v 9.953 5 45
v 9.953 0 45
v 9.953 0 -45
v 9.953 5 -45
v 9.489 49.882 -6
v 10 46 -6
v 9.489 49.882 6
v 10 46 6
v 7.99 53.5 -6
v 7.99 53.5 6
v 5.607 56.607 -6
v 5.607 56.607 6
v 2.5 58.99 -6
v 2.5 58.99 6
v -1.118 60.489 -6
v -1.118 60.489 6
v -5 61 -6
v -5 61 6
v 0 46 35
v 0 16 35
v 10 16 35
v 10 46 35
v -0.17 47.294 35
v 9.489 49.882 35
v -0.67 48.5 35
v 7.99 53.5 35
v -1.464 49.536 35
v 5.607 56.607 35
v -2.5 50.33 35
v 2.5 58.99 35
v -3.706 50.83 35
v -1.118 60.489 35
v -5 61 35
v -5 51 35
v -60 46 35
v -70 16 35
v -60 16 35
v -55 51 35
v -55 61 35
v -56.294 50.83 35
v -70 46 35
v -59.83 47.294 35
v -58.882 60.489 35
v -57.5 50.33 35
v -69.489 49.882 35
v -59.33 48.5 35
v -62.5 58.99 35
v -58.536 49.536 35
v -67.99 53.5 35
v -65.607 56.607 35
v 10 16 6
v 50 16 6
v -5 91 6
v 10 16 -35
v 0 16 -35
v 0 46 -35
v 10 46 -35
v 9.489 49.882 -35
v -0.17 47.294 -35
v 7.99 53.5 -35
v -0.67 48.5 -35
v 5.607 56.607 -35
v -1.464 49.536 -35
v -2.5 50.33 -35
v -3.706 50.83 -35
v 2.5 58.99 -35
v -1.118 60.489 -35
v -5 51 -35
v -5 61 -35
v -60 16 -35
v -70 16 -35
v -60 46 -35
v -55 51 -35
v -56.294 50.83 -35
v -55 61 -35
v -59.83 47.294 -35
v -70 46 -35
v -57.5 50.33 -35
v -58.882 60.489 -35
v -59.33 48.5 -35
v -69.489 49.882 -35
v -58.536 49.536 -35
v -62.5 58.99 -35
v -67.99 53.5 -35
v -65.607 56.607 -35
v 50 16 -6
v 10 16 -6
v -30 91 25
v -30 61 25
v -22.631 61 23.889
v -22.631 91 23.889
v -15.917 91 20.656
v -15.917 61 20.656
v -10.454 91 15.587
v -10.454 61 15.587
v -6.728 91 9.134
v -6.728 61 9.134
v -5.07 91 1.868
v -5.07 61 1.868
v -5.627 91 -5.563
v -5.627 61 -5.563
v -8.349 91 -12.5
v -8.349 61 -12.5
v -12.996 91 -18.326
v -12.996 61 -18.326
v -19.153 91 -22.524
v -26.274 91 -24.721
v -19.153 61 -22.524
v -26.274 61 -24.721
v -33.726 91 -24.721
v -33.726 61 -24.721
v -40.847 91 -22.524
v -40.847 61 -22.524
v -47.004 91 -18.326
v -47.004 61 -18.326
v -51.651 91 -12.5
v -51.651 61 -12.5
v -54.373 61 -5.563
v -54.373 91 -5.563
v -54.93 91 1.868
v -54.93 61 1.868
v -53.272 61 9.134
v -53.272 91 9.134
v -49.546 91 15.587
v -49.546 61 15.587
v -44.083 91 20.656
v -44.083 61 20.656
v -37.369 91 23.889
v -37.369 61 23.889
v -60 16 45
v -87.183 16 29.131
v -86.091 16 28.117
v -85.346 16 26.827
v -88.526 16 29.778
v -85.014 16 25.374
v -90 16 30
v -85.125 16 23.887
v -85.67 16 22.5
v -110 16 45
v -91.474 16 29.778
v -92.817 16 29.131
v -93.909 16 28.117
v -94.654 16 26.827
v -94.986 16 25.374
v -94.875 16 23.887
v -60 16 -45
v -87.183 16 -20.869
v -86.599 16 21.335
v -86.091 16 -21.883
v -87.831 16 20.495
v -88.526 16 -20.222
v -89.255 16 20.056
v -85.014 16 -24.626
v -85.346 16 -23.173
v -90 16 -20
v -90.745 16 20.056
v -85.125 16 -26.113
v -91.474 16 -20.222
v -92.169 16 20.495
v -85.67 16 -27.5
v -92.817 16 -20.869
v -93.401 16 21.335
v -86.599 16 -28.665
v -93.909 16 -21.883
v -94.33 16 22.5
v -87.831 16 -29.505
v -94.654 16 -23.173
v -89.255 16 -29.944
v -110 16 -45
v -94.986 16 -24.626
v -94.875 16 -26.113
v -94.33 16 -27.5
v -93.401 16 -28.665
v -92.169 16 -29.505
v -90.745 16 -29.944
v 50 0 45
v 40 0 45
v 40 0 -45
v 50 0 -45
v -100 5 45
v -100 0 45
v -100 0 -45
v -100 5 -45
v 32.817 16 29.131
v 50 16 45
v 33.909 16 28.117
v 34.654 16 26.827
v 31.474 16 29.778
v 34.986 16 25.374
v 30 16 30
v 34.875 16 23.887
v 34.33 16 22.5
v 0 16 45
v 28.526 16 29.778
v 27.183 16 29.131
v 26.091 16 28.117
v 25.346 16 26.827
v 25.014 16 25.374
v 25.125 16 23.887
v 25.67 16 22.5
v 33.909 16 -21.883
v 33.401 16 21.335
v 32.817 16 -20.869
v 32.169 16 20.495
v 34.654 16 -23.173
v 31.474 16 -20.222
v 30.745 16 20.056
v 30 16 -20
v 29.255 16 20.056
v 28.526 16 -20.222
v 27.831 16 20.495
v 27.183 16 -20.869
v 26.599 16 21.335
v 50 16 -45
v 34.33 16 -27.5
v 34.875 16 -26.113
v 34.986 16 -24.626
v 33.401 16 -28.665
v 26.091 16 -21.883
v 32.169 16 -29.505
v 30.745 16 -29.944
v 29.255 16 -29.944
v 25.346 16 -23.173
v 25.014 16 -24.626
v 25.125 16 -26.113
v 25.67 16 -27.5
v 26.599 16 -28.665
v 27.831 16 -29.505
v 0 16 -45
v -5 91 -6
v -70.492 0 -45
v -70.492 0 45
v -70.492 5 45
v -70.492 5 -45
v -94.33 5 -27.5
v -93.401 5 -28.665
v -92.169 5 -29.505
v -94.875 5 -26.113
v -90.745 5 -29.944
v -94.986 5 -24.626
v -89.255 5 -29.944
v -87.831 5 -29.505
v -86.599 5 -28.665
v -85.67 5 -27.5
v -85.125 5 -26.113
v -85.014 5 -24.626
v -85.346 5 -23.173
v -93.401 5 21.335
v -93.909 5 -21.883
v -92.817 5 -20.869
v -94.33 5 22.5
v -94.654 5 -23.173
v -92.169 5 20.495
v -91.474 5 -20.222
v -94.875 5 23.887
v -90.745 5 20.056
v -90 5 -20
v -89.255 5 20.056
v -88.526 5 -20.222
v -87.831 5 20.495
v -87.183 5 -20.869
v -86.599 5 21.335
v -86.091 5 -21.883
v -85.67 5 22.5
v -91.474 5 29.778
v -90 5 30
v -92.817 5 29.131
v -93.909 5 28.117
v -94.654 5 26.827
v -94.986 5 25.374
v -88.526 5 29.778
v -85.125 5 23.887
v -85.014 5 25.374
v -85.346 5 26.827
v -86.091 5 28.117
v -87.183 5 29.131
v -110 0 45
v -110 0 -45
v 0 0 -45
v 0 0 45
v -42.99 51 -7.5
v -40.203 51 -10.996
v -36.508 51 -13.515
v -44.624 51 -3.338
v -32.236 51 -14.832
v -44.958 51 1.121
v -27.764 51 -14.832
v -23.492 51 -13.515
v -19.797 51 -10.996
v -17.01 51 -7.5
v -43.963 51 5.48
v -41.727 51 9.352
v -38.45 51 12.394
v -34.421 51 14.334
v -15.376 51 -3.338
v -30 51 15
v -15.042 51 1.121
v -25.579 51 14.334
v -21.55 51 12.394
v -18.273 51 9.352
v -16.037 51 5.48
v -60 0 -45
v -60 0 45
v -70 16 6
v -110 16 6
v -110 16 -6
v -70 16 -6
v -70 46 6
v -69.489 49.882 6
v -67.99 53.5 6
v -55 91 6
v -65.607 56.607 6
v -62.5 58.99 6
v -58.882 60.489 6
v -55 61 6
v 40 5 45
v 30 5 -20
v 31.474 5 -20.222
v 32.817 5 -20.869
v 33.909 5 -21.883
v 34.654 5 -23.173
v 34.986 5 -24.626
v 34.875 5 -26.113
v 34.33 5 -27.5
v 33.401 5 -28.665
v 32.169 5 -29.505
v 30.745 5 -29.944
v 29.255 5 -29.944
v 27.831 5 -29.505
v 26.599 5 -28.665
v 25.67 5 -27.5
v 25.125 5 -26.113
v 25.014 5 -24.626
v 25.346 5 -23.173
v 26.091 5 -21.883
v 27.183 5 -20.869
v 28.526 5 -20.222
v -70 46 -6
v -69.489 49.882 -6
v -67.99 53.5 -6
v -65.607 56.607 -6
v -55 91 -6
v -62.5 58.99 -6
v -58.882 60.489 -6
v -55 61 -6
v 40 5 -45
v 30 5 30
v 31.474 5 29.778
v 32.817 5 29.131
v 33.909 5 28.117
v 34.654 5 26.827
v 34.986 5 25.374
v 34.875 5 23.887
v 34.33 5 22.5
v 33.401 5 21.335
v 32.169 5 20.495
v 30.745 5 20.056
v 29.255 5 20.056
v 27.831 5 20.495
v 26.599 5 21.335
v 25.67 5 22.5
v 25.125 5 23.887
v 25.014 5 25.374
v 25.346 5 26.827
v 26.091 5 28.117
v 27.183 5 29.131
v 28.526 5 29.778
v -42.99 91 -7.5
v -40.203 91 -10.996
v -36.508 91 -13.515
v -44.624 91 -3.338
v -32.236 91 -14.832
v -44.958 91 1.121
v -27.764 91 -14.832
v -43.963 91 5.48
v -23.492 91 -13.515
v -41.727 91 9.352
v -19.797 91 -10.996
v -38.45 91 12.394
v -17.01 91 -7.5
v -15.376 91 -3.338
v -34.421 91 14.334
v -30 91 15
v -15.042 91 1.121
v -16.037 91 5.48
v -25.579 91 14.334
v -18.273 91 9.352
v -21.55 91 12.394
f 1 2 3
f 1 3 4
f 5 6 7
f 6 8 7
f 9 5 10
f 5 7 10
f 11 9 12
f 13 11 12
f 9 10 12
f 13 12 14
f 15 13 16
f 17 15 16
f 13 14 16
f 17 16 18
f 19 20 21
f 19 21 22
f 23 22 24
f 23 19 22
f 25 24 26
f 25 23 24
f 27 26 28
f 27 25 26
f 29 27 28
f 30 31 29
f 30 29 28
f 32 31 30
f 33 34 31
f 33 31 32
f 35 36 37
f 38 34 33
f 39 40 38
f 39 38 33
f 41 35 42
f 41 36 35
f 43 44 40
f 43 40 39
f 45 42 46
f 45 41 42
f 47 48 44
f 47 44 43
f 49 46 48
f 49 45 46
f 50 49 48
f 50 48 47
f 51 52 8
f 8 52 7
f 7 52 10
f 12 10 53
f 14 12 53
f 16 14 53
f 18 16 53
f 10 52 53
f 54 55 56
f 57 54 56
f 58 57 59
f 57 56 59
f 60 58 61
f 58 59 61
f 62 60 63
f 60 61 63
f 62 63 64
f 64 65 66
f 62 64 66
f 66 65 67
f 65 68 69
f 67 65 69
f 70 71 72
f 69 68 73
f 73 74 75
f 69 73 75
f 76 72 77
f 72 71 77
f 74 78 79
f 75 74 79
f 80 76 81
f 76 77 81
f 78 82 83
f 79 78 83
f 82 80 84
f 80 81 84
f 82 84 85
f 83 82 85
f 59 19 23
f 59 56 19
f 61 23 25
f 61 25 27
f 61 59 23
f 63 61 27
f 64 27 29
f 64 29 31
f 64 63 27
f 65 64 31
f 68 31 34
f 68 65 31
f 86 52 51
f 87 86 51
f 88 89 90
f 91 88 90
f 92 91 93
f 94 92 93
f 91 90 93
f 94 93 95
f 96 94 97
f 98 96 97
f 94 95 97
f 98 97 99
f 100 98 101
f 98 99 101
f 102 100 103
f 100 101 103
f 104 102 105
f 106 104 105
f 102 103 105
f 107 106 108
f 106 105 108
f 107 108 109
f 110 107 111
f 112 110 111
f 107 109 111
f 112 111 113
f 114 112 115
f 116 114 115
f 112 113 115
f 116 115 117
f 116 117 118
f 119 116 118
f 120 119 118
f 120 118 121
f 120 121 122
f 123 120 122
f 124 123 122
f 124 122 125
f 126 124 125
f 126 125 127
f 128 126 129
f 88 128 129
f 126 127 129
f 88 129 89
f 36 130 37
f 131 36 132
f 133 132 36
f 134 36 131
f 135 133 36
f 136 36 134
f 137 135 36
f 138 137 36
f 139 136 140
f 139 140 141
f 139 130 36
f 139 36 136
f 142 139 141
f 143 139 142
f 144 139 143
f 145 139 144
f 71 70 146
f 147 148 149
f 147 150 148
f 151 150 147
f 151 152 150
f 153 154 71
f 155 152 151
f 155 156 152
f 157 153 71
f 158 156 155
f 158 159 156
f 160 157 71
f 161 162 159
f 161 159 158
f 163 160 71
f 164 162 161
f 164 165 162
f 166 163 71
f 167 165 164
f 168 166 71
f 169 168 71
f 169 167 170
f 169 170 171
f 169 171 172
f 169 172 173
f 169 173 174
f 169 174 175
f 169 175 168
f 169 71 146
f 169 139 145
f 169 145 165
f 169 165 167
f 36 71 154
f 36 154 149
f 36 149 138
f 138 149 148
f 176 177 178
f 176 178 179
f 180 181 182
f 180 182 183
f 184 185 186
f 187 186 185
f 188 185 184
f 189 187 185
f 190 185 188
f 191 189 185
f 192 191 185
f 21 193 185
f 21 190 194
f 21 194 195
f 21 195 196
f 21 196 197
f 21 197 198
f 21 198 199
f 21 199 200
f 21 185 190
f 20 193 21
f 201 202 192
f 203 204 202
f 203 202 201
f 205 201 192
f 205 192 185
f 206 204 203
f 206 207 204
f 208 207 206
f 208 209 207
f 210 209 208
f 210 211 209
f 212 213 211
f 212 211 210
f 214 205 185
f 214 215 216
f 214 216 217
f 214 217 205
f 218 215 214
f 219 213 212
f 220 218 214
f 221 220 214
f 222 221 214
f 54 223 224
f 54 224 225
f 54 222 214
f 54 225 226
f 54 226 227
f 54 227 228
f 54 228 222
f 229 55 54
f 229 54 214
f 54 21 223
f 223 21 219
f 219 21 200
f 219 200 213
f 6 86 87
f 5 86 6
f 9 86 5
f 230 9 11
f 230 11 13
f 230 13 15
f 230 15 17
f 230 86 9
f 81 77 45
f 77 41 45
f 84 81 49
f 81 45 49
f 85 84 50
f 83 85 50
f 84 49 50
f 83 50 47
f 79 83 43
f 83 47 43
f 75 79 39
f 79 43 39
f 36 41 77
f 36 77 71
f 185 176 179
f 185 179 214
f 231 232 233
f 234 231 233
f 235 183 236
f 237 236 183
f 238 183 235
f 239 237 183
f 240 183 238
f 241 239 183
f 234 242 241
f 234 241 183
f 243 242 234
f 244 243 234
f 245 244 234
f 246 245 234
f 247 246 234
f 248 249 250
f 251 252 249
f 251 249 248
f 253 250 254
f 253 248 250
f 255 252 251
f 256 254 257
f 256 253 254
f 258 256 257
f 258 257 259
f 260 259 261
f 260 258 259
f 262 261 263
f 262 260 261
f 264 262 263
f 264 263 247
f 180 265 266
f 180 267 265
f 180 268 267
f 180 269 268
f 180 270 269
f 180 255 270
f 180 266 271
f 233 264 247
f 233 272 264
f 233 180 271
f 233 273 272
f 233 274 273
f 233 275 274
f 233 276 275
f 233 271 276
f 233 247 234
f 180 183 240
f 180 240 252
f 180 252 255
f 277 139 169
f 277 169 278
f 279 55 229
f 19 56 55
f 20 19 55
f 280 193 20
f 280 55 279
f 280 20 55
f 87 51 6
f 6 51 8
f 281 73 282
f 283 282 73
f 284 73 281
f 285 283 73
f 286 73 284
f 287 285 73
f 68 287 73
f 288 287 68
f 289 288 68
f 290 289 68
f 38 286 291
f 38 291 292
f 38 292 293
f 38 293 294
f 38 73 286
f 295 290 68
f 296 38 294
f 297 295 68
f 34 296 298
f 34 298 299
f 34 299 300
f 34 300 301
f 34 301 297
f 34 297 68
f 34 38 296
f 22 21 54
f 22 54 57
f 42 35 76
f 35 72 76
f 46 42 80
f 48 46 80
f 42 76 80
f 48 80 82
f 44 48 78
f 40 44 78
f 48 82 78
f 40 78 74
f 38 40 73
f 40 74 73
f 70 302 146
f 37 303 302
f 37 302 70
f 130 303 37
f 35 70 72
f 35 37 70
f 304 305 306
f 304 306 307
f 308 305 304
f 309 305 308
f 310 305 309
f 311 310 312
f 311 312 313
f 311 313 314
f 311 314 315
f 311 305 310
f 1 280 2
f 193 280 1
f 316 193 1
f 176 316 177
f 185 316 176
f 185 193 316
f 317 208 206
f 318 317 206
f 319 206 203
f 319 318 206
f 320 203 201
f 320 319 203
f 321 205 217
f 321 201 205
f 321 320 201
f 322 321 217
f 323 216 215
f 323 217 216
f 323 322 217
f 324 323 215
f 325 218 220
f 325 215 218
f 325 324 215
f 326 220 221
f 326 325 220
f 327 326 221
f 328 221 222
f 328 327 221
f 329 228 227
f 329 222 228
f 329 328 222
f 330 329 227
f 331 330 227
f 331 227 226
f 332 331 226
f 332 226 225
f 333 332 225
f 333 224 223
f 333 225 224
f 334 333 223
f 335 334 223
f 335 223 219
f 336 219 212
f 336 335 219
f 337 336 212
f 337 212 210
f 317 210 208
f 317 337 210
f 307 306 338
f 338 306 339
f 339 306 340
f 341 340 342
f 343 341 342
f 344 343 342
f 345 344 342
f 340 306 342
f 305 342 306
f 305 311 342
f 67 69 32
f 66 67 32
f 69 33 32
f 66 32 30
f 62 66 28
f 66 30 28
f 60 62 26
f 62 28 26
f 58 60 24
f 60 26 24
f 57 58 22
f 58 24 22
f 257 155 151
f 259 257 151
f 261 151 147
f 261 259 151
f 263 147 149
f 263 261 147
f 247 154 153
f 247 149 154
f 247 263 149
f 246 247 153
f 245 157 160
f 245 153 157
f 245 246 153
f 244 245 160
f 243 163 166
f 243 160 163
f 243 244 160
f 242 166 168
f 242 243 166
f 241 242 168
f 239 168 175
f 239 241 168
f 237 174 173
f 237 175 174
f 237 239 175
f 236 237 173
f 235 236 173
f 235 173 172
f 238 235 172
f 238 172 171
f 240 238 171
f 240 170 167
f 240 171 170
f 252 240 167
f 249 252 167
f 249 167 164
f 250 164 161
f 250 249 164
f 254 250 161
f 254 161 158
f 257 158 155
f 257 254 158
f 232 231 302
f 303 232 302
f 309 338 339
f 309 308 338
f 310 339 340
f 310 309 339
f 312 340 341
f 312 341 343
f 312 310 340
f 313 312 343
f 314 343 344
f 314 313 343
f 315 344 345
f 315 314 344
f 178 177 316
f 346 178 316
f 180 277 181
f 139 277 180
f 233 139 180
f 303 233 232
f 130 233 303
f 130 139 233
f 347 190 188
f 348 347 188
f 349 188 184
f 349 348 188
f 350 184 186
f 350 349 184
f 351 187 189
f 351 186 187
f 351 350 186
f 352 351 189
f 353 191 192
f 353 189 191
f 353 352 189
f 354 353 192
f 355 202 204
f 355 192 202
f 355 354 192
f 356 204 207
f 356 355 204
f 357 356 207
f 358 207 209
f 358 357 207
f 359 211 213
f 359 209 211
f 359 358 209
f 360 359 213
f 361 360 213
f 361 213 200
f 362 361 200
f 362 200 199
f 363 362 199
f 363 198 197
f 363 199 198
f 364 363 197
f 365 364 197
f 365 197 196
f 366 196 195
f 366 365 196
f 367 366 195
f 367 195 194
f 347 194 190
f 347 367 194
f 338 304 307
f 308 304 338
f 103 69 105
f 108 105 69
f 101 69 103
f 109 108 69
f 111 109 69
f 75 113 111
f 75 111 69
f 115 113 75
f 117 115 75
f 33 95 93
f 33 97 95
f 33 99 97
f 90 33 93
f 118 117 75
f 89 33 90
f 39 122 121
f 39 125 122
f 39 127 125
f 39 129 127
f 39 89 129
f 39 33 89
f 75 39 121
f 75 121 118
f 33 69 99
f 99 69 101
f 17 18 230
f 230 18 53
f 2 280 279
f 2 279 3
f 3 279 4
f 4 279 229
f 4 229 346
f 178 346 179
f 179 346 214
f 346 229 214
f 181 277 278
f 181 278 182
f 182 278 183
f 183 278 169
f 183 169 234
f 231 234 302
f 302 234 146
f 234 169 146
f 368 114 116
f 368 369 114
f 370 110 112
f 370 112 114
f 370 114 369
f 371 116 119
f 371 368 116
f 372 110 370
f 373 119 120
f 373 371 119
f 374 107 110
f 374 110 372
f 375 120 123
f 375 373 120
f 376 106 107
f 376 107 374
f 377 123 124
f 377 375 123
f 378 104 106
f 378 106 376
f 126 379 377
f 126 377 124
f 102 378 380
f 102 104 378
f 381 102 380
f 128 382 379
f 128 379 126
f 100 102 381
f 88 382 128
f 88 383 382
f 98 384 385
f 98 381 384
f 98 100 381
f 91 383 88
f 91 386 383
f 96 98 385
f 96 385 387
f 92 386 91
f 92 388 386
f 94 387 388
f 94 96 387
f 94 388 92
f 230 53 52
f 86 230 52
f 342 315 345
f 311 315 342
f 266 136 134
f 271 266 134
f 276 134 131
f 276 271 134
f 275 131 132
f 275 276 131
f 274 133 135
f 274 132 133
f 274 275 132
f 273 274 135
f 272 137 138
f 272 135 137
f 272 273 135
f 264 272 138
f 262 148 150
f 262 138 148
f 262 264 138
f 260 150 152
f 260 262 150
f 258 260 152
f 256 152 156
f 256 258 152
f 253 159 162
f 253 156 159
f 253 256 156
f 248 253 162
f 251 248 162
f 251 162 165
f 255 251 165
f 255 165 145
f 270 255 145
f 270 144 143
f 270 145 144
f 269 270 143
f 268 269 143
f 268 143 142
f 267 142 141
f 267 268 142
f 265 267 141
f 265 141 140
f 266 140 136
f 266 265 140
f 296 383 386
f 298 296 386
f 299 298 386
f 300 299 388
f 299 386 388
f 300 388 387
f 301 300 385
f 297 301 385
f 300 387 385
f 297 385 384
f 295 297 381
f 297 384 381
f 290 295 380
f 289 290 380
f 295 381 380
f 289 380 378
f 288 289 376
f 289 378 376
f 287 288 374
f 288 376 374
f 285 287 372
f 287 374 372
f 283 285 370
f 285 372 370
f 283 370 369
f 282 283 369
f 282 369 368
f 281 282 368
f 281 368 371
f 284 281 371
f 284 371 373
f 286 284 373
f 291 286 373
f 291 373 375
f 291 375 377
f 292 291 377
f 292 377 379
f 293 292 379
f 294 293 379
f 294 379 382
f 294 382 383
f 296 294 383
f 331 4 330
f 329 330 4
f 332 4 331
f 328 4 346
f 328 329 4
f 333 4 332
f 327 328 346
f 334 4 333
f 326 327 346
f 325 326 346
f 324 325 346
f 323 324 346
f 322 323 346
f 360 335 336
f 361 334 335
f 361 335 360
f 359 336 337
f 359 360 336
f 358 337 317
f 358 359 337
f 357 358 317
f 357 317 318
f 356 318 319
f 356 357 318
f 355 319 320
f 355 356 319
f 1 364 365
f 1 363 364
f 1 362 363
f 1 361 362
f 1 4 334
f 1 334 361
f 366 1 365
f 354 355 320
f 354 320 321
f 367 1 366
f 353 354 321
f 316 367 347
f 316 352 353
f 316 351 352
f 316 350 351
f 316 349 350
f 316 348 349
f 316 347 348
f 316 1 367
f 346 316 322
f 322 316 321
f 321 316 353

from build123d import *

# Parameters (mm, degrees)
BOSS_EXTRUDE1_DEPTH     = 45
SKETCH3_W               = 29.50841585
SKETCH3_H               = 5
SKETCH3_W_2             = 30.047341964
CUT_EXTRUDE1_DEPTH      = 155.664152278
CUT_EXTRUDE2_DEPTH      = 134.588921696
CUT_EXTRUDE2_DEPTH_BACK = 134.588921696
SKETCH4_W               = 10
SKETCH4_H               = 45
SKETCH6_R               = 25
BOSS_EXTRUDE2_DEPTH     = 30
SKETCH7_R               = 15
CUT_EXTRUDE4_DEPTH      = 150.686338722
FILLET1_R               = 15
FILLET2_R               = 5
FILLET3_R               = 15
FILLET4_R               = 5
BOSS_EXTRUDE3_DEPTH     = 6
BOSS_EXTRUDE3_2_DEPTH   = 6
CUT_EXTRUDE5_DEPTH      = 141.534693226
CUT_EXTRUDE5_DEPTH_BACK = 141.534693226
SKETCH16_R              = 5


with BuildPart() as part:
    # Sketch1 → Boss-Extrude1 (new, symmetric)
    with BuildSketch(Plane.XY):
        Polygon((0, 0), (50, 0), (50, 16), (10, 16), (10, 61), (-70, 61), (-70, 16), (-110, 16), (-110, 0), (-60, 0), (-60, 16), (-60, 51), (0, 51), (0, 3.811417612), align=None)
    extrude(amount=BOSS_EXTRUDE1_DEPTH, both=True)

    # Sketch3 → Cut-Extrude1 (cut, through all)
    with BuildSketch(Plane.XY.offset(45)):
        with Locations((-85.245792075, 2.5)):
            Rectangle(SKETCH3_W, SKETCH3_H)
        with Locations((24.976329018, 2.5)):
            Rectangle(SKETCH3_W_2, SKETCH3_H)
    extrude(amount=-CUT_EXTRUDE1_DEPTH, mode=Mode.SUBTRACT)

    # Sketch4 → Cut-Extrude2 (cut, two sides: drawn at the far end of the back side and taken through both)
    with BuildSketch(Plane(origin=(0, 0, 0), x_dir=(0, 0, -1), z_dir=(1, 0, 0)).offset(-CUT_EXTRUDE2_DEPTH_BACK)):
        with Locations((40, 38.5)):
            Rectangle(SKETCH4_W, SKETCH4_H)
        with Locations((-40, 38.5)):
            Rectangle(SKETCH4_W, SKETCH4_H)
    extrude(amount=CUT_EXTRUDE2_DEPTH + CUT_EXTRUDE2_DEPTH_BACK, mode=Mode.SUBTRACT)

    # Sketch6 → Boss-Extrude2 (add)
    with BuildSketch(Plane(origin=(0, 61, 0), x_dir=(1, 0, 0), z_dir=(0, 1, 0))):
        with Locations(Location((-30, 0, 0), (0, 0, 270))):
            Circle(SKETCH6_R)
    extrude(amount=BOSS_EXTRUDE2_DEPTH)

    # Sketch7 → Cut-Extrude4 (cut, through all)
    with BuildSketch(Plane(origin=(0, 91, 0), x_dir=(1, 0, 0), z_dir=(0, 1, 0))):
        with Locations(Location((-30, 0, 0), (0, 0, 270))):
            Circle(SKETCH7_R)
    extrude(amount=-CUT_EXTRUDE4_DEPTH, mode=Mode.SUBTRACT)

    # Fillet1
    fillet1_edges = [part.edges().sort_by_distance(p)[0] for p in [
        (-70, 61, 0),
    ]]
    fillet(fillet1_edges, radius=FILLET1_R - 0.0001)  # a hair under: the kernel refuses the full size

    # Fillet2
    fillet2_edges = [part.edges().sort_by_distance(p)[0] for p in [
        (-60, 51, 0),
    ]]
    fillet(fillet2_edges, radius=FILLET2_R)

    # Fillet3
    fillet3_edges = [part.edges().sort_by_distance(p)[0] for p in [
        (10, 61, 0),
    ]]
    fillet(fillet3_edges, radius=FILLET3_R)

    # Fillet4
    fillet4_edges = [part.edges().sort_by_distance(p)[0] for p in [
        (0, 51, 0),
    ]]
    fillet(fillet4_edges, radius=FILLET4_R)

    # Sketch16 → Cut-Extrude5 (cut, two sides: drawn at the far end of the back side and taken through both)
    with BuildSketch(Plane(origin=(0, 16, 0), x_dir=(1, 0, 0), z_dir=(0, 1, 0)).offset(-CUT_EXTRUDE5_DEPTH_BACK)):
        with Locations(Location((-90, 25, 0), (0, 0, 270))):
            Circle(SKETCH16_R)
        with Locations(Location((-90, -25, 0), (0, 0, 270))):
            Circle(SKETCH16_R)
        with Locations(Location((30, 25, 0), (0, 0, 270))):
            Circle(SKETCH16_R)
        with Locations(Location((30, -25, 0), (0, 0, 270))):
            Circle(SKETCH16_R)
    extrude(amount=CUT_EXTRUDE5_DEPTH + CUT_EXTRUDE5_DEPTH_BACK, mode=Mode.SUBTRACT)


with BuildPart() as body_2:
    # Sketch12 → Boss-Extrude3 (new, symmetric)
    with BuildSketch(Plane.XY):
        with BuildLine():
            Line((-55, 91), (-110, 16))
            Line((-110, 16), (-70, 16))
            Line((-70, 16), (-70, 46))
            ThreePointArc((-70, 46), (-65.606601718, 56.606601718), (-55, 61))
            Line((-55, 61), (-55, 91))
        make_face()
    extrude(amount=BOSS_EXTRUDE3_DEPTH, both=True)


with BuildPart() as body_3:
    # Sketch12 → Boss-Extrude3 2 (new, symmetric)
    with BuildSketch(Plane.XY):
        with BuildLine():
            Line((50, 16), (10, 16))
            Line((10, 16), (10, 46))
            ThreePointArc((10, 46), (5.606601718, 56.606601718), (-5, 61))
            Line((-5, 61), (-5, 91))
            Line((-5, 91), (50, 16))
        make_face()
    extrude(amount=BOSS_EXTRUDE3_2_DEPTH, both=True)


solid = Compound([part.part, body_2.part, body_3.part])
